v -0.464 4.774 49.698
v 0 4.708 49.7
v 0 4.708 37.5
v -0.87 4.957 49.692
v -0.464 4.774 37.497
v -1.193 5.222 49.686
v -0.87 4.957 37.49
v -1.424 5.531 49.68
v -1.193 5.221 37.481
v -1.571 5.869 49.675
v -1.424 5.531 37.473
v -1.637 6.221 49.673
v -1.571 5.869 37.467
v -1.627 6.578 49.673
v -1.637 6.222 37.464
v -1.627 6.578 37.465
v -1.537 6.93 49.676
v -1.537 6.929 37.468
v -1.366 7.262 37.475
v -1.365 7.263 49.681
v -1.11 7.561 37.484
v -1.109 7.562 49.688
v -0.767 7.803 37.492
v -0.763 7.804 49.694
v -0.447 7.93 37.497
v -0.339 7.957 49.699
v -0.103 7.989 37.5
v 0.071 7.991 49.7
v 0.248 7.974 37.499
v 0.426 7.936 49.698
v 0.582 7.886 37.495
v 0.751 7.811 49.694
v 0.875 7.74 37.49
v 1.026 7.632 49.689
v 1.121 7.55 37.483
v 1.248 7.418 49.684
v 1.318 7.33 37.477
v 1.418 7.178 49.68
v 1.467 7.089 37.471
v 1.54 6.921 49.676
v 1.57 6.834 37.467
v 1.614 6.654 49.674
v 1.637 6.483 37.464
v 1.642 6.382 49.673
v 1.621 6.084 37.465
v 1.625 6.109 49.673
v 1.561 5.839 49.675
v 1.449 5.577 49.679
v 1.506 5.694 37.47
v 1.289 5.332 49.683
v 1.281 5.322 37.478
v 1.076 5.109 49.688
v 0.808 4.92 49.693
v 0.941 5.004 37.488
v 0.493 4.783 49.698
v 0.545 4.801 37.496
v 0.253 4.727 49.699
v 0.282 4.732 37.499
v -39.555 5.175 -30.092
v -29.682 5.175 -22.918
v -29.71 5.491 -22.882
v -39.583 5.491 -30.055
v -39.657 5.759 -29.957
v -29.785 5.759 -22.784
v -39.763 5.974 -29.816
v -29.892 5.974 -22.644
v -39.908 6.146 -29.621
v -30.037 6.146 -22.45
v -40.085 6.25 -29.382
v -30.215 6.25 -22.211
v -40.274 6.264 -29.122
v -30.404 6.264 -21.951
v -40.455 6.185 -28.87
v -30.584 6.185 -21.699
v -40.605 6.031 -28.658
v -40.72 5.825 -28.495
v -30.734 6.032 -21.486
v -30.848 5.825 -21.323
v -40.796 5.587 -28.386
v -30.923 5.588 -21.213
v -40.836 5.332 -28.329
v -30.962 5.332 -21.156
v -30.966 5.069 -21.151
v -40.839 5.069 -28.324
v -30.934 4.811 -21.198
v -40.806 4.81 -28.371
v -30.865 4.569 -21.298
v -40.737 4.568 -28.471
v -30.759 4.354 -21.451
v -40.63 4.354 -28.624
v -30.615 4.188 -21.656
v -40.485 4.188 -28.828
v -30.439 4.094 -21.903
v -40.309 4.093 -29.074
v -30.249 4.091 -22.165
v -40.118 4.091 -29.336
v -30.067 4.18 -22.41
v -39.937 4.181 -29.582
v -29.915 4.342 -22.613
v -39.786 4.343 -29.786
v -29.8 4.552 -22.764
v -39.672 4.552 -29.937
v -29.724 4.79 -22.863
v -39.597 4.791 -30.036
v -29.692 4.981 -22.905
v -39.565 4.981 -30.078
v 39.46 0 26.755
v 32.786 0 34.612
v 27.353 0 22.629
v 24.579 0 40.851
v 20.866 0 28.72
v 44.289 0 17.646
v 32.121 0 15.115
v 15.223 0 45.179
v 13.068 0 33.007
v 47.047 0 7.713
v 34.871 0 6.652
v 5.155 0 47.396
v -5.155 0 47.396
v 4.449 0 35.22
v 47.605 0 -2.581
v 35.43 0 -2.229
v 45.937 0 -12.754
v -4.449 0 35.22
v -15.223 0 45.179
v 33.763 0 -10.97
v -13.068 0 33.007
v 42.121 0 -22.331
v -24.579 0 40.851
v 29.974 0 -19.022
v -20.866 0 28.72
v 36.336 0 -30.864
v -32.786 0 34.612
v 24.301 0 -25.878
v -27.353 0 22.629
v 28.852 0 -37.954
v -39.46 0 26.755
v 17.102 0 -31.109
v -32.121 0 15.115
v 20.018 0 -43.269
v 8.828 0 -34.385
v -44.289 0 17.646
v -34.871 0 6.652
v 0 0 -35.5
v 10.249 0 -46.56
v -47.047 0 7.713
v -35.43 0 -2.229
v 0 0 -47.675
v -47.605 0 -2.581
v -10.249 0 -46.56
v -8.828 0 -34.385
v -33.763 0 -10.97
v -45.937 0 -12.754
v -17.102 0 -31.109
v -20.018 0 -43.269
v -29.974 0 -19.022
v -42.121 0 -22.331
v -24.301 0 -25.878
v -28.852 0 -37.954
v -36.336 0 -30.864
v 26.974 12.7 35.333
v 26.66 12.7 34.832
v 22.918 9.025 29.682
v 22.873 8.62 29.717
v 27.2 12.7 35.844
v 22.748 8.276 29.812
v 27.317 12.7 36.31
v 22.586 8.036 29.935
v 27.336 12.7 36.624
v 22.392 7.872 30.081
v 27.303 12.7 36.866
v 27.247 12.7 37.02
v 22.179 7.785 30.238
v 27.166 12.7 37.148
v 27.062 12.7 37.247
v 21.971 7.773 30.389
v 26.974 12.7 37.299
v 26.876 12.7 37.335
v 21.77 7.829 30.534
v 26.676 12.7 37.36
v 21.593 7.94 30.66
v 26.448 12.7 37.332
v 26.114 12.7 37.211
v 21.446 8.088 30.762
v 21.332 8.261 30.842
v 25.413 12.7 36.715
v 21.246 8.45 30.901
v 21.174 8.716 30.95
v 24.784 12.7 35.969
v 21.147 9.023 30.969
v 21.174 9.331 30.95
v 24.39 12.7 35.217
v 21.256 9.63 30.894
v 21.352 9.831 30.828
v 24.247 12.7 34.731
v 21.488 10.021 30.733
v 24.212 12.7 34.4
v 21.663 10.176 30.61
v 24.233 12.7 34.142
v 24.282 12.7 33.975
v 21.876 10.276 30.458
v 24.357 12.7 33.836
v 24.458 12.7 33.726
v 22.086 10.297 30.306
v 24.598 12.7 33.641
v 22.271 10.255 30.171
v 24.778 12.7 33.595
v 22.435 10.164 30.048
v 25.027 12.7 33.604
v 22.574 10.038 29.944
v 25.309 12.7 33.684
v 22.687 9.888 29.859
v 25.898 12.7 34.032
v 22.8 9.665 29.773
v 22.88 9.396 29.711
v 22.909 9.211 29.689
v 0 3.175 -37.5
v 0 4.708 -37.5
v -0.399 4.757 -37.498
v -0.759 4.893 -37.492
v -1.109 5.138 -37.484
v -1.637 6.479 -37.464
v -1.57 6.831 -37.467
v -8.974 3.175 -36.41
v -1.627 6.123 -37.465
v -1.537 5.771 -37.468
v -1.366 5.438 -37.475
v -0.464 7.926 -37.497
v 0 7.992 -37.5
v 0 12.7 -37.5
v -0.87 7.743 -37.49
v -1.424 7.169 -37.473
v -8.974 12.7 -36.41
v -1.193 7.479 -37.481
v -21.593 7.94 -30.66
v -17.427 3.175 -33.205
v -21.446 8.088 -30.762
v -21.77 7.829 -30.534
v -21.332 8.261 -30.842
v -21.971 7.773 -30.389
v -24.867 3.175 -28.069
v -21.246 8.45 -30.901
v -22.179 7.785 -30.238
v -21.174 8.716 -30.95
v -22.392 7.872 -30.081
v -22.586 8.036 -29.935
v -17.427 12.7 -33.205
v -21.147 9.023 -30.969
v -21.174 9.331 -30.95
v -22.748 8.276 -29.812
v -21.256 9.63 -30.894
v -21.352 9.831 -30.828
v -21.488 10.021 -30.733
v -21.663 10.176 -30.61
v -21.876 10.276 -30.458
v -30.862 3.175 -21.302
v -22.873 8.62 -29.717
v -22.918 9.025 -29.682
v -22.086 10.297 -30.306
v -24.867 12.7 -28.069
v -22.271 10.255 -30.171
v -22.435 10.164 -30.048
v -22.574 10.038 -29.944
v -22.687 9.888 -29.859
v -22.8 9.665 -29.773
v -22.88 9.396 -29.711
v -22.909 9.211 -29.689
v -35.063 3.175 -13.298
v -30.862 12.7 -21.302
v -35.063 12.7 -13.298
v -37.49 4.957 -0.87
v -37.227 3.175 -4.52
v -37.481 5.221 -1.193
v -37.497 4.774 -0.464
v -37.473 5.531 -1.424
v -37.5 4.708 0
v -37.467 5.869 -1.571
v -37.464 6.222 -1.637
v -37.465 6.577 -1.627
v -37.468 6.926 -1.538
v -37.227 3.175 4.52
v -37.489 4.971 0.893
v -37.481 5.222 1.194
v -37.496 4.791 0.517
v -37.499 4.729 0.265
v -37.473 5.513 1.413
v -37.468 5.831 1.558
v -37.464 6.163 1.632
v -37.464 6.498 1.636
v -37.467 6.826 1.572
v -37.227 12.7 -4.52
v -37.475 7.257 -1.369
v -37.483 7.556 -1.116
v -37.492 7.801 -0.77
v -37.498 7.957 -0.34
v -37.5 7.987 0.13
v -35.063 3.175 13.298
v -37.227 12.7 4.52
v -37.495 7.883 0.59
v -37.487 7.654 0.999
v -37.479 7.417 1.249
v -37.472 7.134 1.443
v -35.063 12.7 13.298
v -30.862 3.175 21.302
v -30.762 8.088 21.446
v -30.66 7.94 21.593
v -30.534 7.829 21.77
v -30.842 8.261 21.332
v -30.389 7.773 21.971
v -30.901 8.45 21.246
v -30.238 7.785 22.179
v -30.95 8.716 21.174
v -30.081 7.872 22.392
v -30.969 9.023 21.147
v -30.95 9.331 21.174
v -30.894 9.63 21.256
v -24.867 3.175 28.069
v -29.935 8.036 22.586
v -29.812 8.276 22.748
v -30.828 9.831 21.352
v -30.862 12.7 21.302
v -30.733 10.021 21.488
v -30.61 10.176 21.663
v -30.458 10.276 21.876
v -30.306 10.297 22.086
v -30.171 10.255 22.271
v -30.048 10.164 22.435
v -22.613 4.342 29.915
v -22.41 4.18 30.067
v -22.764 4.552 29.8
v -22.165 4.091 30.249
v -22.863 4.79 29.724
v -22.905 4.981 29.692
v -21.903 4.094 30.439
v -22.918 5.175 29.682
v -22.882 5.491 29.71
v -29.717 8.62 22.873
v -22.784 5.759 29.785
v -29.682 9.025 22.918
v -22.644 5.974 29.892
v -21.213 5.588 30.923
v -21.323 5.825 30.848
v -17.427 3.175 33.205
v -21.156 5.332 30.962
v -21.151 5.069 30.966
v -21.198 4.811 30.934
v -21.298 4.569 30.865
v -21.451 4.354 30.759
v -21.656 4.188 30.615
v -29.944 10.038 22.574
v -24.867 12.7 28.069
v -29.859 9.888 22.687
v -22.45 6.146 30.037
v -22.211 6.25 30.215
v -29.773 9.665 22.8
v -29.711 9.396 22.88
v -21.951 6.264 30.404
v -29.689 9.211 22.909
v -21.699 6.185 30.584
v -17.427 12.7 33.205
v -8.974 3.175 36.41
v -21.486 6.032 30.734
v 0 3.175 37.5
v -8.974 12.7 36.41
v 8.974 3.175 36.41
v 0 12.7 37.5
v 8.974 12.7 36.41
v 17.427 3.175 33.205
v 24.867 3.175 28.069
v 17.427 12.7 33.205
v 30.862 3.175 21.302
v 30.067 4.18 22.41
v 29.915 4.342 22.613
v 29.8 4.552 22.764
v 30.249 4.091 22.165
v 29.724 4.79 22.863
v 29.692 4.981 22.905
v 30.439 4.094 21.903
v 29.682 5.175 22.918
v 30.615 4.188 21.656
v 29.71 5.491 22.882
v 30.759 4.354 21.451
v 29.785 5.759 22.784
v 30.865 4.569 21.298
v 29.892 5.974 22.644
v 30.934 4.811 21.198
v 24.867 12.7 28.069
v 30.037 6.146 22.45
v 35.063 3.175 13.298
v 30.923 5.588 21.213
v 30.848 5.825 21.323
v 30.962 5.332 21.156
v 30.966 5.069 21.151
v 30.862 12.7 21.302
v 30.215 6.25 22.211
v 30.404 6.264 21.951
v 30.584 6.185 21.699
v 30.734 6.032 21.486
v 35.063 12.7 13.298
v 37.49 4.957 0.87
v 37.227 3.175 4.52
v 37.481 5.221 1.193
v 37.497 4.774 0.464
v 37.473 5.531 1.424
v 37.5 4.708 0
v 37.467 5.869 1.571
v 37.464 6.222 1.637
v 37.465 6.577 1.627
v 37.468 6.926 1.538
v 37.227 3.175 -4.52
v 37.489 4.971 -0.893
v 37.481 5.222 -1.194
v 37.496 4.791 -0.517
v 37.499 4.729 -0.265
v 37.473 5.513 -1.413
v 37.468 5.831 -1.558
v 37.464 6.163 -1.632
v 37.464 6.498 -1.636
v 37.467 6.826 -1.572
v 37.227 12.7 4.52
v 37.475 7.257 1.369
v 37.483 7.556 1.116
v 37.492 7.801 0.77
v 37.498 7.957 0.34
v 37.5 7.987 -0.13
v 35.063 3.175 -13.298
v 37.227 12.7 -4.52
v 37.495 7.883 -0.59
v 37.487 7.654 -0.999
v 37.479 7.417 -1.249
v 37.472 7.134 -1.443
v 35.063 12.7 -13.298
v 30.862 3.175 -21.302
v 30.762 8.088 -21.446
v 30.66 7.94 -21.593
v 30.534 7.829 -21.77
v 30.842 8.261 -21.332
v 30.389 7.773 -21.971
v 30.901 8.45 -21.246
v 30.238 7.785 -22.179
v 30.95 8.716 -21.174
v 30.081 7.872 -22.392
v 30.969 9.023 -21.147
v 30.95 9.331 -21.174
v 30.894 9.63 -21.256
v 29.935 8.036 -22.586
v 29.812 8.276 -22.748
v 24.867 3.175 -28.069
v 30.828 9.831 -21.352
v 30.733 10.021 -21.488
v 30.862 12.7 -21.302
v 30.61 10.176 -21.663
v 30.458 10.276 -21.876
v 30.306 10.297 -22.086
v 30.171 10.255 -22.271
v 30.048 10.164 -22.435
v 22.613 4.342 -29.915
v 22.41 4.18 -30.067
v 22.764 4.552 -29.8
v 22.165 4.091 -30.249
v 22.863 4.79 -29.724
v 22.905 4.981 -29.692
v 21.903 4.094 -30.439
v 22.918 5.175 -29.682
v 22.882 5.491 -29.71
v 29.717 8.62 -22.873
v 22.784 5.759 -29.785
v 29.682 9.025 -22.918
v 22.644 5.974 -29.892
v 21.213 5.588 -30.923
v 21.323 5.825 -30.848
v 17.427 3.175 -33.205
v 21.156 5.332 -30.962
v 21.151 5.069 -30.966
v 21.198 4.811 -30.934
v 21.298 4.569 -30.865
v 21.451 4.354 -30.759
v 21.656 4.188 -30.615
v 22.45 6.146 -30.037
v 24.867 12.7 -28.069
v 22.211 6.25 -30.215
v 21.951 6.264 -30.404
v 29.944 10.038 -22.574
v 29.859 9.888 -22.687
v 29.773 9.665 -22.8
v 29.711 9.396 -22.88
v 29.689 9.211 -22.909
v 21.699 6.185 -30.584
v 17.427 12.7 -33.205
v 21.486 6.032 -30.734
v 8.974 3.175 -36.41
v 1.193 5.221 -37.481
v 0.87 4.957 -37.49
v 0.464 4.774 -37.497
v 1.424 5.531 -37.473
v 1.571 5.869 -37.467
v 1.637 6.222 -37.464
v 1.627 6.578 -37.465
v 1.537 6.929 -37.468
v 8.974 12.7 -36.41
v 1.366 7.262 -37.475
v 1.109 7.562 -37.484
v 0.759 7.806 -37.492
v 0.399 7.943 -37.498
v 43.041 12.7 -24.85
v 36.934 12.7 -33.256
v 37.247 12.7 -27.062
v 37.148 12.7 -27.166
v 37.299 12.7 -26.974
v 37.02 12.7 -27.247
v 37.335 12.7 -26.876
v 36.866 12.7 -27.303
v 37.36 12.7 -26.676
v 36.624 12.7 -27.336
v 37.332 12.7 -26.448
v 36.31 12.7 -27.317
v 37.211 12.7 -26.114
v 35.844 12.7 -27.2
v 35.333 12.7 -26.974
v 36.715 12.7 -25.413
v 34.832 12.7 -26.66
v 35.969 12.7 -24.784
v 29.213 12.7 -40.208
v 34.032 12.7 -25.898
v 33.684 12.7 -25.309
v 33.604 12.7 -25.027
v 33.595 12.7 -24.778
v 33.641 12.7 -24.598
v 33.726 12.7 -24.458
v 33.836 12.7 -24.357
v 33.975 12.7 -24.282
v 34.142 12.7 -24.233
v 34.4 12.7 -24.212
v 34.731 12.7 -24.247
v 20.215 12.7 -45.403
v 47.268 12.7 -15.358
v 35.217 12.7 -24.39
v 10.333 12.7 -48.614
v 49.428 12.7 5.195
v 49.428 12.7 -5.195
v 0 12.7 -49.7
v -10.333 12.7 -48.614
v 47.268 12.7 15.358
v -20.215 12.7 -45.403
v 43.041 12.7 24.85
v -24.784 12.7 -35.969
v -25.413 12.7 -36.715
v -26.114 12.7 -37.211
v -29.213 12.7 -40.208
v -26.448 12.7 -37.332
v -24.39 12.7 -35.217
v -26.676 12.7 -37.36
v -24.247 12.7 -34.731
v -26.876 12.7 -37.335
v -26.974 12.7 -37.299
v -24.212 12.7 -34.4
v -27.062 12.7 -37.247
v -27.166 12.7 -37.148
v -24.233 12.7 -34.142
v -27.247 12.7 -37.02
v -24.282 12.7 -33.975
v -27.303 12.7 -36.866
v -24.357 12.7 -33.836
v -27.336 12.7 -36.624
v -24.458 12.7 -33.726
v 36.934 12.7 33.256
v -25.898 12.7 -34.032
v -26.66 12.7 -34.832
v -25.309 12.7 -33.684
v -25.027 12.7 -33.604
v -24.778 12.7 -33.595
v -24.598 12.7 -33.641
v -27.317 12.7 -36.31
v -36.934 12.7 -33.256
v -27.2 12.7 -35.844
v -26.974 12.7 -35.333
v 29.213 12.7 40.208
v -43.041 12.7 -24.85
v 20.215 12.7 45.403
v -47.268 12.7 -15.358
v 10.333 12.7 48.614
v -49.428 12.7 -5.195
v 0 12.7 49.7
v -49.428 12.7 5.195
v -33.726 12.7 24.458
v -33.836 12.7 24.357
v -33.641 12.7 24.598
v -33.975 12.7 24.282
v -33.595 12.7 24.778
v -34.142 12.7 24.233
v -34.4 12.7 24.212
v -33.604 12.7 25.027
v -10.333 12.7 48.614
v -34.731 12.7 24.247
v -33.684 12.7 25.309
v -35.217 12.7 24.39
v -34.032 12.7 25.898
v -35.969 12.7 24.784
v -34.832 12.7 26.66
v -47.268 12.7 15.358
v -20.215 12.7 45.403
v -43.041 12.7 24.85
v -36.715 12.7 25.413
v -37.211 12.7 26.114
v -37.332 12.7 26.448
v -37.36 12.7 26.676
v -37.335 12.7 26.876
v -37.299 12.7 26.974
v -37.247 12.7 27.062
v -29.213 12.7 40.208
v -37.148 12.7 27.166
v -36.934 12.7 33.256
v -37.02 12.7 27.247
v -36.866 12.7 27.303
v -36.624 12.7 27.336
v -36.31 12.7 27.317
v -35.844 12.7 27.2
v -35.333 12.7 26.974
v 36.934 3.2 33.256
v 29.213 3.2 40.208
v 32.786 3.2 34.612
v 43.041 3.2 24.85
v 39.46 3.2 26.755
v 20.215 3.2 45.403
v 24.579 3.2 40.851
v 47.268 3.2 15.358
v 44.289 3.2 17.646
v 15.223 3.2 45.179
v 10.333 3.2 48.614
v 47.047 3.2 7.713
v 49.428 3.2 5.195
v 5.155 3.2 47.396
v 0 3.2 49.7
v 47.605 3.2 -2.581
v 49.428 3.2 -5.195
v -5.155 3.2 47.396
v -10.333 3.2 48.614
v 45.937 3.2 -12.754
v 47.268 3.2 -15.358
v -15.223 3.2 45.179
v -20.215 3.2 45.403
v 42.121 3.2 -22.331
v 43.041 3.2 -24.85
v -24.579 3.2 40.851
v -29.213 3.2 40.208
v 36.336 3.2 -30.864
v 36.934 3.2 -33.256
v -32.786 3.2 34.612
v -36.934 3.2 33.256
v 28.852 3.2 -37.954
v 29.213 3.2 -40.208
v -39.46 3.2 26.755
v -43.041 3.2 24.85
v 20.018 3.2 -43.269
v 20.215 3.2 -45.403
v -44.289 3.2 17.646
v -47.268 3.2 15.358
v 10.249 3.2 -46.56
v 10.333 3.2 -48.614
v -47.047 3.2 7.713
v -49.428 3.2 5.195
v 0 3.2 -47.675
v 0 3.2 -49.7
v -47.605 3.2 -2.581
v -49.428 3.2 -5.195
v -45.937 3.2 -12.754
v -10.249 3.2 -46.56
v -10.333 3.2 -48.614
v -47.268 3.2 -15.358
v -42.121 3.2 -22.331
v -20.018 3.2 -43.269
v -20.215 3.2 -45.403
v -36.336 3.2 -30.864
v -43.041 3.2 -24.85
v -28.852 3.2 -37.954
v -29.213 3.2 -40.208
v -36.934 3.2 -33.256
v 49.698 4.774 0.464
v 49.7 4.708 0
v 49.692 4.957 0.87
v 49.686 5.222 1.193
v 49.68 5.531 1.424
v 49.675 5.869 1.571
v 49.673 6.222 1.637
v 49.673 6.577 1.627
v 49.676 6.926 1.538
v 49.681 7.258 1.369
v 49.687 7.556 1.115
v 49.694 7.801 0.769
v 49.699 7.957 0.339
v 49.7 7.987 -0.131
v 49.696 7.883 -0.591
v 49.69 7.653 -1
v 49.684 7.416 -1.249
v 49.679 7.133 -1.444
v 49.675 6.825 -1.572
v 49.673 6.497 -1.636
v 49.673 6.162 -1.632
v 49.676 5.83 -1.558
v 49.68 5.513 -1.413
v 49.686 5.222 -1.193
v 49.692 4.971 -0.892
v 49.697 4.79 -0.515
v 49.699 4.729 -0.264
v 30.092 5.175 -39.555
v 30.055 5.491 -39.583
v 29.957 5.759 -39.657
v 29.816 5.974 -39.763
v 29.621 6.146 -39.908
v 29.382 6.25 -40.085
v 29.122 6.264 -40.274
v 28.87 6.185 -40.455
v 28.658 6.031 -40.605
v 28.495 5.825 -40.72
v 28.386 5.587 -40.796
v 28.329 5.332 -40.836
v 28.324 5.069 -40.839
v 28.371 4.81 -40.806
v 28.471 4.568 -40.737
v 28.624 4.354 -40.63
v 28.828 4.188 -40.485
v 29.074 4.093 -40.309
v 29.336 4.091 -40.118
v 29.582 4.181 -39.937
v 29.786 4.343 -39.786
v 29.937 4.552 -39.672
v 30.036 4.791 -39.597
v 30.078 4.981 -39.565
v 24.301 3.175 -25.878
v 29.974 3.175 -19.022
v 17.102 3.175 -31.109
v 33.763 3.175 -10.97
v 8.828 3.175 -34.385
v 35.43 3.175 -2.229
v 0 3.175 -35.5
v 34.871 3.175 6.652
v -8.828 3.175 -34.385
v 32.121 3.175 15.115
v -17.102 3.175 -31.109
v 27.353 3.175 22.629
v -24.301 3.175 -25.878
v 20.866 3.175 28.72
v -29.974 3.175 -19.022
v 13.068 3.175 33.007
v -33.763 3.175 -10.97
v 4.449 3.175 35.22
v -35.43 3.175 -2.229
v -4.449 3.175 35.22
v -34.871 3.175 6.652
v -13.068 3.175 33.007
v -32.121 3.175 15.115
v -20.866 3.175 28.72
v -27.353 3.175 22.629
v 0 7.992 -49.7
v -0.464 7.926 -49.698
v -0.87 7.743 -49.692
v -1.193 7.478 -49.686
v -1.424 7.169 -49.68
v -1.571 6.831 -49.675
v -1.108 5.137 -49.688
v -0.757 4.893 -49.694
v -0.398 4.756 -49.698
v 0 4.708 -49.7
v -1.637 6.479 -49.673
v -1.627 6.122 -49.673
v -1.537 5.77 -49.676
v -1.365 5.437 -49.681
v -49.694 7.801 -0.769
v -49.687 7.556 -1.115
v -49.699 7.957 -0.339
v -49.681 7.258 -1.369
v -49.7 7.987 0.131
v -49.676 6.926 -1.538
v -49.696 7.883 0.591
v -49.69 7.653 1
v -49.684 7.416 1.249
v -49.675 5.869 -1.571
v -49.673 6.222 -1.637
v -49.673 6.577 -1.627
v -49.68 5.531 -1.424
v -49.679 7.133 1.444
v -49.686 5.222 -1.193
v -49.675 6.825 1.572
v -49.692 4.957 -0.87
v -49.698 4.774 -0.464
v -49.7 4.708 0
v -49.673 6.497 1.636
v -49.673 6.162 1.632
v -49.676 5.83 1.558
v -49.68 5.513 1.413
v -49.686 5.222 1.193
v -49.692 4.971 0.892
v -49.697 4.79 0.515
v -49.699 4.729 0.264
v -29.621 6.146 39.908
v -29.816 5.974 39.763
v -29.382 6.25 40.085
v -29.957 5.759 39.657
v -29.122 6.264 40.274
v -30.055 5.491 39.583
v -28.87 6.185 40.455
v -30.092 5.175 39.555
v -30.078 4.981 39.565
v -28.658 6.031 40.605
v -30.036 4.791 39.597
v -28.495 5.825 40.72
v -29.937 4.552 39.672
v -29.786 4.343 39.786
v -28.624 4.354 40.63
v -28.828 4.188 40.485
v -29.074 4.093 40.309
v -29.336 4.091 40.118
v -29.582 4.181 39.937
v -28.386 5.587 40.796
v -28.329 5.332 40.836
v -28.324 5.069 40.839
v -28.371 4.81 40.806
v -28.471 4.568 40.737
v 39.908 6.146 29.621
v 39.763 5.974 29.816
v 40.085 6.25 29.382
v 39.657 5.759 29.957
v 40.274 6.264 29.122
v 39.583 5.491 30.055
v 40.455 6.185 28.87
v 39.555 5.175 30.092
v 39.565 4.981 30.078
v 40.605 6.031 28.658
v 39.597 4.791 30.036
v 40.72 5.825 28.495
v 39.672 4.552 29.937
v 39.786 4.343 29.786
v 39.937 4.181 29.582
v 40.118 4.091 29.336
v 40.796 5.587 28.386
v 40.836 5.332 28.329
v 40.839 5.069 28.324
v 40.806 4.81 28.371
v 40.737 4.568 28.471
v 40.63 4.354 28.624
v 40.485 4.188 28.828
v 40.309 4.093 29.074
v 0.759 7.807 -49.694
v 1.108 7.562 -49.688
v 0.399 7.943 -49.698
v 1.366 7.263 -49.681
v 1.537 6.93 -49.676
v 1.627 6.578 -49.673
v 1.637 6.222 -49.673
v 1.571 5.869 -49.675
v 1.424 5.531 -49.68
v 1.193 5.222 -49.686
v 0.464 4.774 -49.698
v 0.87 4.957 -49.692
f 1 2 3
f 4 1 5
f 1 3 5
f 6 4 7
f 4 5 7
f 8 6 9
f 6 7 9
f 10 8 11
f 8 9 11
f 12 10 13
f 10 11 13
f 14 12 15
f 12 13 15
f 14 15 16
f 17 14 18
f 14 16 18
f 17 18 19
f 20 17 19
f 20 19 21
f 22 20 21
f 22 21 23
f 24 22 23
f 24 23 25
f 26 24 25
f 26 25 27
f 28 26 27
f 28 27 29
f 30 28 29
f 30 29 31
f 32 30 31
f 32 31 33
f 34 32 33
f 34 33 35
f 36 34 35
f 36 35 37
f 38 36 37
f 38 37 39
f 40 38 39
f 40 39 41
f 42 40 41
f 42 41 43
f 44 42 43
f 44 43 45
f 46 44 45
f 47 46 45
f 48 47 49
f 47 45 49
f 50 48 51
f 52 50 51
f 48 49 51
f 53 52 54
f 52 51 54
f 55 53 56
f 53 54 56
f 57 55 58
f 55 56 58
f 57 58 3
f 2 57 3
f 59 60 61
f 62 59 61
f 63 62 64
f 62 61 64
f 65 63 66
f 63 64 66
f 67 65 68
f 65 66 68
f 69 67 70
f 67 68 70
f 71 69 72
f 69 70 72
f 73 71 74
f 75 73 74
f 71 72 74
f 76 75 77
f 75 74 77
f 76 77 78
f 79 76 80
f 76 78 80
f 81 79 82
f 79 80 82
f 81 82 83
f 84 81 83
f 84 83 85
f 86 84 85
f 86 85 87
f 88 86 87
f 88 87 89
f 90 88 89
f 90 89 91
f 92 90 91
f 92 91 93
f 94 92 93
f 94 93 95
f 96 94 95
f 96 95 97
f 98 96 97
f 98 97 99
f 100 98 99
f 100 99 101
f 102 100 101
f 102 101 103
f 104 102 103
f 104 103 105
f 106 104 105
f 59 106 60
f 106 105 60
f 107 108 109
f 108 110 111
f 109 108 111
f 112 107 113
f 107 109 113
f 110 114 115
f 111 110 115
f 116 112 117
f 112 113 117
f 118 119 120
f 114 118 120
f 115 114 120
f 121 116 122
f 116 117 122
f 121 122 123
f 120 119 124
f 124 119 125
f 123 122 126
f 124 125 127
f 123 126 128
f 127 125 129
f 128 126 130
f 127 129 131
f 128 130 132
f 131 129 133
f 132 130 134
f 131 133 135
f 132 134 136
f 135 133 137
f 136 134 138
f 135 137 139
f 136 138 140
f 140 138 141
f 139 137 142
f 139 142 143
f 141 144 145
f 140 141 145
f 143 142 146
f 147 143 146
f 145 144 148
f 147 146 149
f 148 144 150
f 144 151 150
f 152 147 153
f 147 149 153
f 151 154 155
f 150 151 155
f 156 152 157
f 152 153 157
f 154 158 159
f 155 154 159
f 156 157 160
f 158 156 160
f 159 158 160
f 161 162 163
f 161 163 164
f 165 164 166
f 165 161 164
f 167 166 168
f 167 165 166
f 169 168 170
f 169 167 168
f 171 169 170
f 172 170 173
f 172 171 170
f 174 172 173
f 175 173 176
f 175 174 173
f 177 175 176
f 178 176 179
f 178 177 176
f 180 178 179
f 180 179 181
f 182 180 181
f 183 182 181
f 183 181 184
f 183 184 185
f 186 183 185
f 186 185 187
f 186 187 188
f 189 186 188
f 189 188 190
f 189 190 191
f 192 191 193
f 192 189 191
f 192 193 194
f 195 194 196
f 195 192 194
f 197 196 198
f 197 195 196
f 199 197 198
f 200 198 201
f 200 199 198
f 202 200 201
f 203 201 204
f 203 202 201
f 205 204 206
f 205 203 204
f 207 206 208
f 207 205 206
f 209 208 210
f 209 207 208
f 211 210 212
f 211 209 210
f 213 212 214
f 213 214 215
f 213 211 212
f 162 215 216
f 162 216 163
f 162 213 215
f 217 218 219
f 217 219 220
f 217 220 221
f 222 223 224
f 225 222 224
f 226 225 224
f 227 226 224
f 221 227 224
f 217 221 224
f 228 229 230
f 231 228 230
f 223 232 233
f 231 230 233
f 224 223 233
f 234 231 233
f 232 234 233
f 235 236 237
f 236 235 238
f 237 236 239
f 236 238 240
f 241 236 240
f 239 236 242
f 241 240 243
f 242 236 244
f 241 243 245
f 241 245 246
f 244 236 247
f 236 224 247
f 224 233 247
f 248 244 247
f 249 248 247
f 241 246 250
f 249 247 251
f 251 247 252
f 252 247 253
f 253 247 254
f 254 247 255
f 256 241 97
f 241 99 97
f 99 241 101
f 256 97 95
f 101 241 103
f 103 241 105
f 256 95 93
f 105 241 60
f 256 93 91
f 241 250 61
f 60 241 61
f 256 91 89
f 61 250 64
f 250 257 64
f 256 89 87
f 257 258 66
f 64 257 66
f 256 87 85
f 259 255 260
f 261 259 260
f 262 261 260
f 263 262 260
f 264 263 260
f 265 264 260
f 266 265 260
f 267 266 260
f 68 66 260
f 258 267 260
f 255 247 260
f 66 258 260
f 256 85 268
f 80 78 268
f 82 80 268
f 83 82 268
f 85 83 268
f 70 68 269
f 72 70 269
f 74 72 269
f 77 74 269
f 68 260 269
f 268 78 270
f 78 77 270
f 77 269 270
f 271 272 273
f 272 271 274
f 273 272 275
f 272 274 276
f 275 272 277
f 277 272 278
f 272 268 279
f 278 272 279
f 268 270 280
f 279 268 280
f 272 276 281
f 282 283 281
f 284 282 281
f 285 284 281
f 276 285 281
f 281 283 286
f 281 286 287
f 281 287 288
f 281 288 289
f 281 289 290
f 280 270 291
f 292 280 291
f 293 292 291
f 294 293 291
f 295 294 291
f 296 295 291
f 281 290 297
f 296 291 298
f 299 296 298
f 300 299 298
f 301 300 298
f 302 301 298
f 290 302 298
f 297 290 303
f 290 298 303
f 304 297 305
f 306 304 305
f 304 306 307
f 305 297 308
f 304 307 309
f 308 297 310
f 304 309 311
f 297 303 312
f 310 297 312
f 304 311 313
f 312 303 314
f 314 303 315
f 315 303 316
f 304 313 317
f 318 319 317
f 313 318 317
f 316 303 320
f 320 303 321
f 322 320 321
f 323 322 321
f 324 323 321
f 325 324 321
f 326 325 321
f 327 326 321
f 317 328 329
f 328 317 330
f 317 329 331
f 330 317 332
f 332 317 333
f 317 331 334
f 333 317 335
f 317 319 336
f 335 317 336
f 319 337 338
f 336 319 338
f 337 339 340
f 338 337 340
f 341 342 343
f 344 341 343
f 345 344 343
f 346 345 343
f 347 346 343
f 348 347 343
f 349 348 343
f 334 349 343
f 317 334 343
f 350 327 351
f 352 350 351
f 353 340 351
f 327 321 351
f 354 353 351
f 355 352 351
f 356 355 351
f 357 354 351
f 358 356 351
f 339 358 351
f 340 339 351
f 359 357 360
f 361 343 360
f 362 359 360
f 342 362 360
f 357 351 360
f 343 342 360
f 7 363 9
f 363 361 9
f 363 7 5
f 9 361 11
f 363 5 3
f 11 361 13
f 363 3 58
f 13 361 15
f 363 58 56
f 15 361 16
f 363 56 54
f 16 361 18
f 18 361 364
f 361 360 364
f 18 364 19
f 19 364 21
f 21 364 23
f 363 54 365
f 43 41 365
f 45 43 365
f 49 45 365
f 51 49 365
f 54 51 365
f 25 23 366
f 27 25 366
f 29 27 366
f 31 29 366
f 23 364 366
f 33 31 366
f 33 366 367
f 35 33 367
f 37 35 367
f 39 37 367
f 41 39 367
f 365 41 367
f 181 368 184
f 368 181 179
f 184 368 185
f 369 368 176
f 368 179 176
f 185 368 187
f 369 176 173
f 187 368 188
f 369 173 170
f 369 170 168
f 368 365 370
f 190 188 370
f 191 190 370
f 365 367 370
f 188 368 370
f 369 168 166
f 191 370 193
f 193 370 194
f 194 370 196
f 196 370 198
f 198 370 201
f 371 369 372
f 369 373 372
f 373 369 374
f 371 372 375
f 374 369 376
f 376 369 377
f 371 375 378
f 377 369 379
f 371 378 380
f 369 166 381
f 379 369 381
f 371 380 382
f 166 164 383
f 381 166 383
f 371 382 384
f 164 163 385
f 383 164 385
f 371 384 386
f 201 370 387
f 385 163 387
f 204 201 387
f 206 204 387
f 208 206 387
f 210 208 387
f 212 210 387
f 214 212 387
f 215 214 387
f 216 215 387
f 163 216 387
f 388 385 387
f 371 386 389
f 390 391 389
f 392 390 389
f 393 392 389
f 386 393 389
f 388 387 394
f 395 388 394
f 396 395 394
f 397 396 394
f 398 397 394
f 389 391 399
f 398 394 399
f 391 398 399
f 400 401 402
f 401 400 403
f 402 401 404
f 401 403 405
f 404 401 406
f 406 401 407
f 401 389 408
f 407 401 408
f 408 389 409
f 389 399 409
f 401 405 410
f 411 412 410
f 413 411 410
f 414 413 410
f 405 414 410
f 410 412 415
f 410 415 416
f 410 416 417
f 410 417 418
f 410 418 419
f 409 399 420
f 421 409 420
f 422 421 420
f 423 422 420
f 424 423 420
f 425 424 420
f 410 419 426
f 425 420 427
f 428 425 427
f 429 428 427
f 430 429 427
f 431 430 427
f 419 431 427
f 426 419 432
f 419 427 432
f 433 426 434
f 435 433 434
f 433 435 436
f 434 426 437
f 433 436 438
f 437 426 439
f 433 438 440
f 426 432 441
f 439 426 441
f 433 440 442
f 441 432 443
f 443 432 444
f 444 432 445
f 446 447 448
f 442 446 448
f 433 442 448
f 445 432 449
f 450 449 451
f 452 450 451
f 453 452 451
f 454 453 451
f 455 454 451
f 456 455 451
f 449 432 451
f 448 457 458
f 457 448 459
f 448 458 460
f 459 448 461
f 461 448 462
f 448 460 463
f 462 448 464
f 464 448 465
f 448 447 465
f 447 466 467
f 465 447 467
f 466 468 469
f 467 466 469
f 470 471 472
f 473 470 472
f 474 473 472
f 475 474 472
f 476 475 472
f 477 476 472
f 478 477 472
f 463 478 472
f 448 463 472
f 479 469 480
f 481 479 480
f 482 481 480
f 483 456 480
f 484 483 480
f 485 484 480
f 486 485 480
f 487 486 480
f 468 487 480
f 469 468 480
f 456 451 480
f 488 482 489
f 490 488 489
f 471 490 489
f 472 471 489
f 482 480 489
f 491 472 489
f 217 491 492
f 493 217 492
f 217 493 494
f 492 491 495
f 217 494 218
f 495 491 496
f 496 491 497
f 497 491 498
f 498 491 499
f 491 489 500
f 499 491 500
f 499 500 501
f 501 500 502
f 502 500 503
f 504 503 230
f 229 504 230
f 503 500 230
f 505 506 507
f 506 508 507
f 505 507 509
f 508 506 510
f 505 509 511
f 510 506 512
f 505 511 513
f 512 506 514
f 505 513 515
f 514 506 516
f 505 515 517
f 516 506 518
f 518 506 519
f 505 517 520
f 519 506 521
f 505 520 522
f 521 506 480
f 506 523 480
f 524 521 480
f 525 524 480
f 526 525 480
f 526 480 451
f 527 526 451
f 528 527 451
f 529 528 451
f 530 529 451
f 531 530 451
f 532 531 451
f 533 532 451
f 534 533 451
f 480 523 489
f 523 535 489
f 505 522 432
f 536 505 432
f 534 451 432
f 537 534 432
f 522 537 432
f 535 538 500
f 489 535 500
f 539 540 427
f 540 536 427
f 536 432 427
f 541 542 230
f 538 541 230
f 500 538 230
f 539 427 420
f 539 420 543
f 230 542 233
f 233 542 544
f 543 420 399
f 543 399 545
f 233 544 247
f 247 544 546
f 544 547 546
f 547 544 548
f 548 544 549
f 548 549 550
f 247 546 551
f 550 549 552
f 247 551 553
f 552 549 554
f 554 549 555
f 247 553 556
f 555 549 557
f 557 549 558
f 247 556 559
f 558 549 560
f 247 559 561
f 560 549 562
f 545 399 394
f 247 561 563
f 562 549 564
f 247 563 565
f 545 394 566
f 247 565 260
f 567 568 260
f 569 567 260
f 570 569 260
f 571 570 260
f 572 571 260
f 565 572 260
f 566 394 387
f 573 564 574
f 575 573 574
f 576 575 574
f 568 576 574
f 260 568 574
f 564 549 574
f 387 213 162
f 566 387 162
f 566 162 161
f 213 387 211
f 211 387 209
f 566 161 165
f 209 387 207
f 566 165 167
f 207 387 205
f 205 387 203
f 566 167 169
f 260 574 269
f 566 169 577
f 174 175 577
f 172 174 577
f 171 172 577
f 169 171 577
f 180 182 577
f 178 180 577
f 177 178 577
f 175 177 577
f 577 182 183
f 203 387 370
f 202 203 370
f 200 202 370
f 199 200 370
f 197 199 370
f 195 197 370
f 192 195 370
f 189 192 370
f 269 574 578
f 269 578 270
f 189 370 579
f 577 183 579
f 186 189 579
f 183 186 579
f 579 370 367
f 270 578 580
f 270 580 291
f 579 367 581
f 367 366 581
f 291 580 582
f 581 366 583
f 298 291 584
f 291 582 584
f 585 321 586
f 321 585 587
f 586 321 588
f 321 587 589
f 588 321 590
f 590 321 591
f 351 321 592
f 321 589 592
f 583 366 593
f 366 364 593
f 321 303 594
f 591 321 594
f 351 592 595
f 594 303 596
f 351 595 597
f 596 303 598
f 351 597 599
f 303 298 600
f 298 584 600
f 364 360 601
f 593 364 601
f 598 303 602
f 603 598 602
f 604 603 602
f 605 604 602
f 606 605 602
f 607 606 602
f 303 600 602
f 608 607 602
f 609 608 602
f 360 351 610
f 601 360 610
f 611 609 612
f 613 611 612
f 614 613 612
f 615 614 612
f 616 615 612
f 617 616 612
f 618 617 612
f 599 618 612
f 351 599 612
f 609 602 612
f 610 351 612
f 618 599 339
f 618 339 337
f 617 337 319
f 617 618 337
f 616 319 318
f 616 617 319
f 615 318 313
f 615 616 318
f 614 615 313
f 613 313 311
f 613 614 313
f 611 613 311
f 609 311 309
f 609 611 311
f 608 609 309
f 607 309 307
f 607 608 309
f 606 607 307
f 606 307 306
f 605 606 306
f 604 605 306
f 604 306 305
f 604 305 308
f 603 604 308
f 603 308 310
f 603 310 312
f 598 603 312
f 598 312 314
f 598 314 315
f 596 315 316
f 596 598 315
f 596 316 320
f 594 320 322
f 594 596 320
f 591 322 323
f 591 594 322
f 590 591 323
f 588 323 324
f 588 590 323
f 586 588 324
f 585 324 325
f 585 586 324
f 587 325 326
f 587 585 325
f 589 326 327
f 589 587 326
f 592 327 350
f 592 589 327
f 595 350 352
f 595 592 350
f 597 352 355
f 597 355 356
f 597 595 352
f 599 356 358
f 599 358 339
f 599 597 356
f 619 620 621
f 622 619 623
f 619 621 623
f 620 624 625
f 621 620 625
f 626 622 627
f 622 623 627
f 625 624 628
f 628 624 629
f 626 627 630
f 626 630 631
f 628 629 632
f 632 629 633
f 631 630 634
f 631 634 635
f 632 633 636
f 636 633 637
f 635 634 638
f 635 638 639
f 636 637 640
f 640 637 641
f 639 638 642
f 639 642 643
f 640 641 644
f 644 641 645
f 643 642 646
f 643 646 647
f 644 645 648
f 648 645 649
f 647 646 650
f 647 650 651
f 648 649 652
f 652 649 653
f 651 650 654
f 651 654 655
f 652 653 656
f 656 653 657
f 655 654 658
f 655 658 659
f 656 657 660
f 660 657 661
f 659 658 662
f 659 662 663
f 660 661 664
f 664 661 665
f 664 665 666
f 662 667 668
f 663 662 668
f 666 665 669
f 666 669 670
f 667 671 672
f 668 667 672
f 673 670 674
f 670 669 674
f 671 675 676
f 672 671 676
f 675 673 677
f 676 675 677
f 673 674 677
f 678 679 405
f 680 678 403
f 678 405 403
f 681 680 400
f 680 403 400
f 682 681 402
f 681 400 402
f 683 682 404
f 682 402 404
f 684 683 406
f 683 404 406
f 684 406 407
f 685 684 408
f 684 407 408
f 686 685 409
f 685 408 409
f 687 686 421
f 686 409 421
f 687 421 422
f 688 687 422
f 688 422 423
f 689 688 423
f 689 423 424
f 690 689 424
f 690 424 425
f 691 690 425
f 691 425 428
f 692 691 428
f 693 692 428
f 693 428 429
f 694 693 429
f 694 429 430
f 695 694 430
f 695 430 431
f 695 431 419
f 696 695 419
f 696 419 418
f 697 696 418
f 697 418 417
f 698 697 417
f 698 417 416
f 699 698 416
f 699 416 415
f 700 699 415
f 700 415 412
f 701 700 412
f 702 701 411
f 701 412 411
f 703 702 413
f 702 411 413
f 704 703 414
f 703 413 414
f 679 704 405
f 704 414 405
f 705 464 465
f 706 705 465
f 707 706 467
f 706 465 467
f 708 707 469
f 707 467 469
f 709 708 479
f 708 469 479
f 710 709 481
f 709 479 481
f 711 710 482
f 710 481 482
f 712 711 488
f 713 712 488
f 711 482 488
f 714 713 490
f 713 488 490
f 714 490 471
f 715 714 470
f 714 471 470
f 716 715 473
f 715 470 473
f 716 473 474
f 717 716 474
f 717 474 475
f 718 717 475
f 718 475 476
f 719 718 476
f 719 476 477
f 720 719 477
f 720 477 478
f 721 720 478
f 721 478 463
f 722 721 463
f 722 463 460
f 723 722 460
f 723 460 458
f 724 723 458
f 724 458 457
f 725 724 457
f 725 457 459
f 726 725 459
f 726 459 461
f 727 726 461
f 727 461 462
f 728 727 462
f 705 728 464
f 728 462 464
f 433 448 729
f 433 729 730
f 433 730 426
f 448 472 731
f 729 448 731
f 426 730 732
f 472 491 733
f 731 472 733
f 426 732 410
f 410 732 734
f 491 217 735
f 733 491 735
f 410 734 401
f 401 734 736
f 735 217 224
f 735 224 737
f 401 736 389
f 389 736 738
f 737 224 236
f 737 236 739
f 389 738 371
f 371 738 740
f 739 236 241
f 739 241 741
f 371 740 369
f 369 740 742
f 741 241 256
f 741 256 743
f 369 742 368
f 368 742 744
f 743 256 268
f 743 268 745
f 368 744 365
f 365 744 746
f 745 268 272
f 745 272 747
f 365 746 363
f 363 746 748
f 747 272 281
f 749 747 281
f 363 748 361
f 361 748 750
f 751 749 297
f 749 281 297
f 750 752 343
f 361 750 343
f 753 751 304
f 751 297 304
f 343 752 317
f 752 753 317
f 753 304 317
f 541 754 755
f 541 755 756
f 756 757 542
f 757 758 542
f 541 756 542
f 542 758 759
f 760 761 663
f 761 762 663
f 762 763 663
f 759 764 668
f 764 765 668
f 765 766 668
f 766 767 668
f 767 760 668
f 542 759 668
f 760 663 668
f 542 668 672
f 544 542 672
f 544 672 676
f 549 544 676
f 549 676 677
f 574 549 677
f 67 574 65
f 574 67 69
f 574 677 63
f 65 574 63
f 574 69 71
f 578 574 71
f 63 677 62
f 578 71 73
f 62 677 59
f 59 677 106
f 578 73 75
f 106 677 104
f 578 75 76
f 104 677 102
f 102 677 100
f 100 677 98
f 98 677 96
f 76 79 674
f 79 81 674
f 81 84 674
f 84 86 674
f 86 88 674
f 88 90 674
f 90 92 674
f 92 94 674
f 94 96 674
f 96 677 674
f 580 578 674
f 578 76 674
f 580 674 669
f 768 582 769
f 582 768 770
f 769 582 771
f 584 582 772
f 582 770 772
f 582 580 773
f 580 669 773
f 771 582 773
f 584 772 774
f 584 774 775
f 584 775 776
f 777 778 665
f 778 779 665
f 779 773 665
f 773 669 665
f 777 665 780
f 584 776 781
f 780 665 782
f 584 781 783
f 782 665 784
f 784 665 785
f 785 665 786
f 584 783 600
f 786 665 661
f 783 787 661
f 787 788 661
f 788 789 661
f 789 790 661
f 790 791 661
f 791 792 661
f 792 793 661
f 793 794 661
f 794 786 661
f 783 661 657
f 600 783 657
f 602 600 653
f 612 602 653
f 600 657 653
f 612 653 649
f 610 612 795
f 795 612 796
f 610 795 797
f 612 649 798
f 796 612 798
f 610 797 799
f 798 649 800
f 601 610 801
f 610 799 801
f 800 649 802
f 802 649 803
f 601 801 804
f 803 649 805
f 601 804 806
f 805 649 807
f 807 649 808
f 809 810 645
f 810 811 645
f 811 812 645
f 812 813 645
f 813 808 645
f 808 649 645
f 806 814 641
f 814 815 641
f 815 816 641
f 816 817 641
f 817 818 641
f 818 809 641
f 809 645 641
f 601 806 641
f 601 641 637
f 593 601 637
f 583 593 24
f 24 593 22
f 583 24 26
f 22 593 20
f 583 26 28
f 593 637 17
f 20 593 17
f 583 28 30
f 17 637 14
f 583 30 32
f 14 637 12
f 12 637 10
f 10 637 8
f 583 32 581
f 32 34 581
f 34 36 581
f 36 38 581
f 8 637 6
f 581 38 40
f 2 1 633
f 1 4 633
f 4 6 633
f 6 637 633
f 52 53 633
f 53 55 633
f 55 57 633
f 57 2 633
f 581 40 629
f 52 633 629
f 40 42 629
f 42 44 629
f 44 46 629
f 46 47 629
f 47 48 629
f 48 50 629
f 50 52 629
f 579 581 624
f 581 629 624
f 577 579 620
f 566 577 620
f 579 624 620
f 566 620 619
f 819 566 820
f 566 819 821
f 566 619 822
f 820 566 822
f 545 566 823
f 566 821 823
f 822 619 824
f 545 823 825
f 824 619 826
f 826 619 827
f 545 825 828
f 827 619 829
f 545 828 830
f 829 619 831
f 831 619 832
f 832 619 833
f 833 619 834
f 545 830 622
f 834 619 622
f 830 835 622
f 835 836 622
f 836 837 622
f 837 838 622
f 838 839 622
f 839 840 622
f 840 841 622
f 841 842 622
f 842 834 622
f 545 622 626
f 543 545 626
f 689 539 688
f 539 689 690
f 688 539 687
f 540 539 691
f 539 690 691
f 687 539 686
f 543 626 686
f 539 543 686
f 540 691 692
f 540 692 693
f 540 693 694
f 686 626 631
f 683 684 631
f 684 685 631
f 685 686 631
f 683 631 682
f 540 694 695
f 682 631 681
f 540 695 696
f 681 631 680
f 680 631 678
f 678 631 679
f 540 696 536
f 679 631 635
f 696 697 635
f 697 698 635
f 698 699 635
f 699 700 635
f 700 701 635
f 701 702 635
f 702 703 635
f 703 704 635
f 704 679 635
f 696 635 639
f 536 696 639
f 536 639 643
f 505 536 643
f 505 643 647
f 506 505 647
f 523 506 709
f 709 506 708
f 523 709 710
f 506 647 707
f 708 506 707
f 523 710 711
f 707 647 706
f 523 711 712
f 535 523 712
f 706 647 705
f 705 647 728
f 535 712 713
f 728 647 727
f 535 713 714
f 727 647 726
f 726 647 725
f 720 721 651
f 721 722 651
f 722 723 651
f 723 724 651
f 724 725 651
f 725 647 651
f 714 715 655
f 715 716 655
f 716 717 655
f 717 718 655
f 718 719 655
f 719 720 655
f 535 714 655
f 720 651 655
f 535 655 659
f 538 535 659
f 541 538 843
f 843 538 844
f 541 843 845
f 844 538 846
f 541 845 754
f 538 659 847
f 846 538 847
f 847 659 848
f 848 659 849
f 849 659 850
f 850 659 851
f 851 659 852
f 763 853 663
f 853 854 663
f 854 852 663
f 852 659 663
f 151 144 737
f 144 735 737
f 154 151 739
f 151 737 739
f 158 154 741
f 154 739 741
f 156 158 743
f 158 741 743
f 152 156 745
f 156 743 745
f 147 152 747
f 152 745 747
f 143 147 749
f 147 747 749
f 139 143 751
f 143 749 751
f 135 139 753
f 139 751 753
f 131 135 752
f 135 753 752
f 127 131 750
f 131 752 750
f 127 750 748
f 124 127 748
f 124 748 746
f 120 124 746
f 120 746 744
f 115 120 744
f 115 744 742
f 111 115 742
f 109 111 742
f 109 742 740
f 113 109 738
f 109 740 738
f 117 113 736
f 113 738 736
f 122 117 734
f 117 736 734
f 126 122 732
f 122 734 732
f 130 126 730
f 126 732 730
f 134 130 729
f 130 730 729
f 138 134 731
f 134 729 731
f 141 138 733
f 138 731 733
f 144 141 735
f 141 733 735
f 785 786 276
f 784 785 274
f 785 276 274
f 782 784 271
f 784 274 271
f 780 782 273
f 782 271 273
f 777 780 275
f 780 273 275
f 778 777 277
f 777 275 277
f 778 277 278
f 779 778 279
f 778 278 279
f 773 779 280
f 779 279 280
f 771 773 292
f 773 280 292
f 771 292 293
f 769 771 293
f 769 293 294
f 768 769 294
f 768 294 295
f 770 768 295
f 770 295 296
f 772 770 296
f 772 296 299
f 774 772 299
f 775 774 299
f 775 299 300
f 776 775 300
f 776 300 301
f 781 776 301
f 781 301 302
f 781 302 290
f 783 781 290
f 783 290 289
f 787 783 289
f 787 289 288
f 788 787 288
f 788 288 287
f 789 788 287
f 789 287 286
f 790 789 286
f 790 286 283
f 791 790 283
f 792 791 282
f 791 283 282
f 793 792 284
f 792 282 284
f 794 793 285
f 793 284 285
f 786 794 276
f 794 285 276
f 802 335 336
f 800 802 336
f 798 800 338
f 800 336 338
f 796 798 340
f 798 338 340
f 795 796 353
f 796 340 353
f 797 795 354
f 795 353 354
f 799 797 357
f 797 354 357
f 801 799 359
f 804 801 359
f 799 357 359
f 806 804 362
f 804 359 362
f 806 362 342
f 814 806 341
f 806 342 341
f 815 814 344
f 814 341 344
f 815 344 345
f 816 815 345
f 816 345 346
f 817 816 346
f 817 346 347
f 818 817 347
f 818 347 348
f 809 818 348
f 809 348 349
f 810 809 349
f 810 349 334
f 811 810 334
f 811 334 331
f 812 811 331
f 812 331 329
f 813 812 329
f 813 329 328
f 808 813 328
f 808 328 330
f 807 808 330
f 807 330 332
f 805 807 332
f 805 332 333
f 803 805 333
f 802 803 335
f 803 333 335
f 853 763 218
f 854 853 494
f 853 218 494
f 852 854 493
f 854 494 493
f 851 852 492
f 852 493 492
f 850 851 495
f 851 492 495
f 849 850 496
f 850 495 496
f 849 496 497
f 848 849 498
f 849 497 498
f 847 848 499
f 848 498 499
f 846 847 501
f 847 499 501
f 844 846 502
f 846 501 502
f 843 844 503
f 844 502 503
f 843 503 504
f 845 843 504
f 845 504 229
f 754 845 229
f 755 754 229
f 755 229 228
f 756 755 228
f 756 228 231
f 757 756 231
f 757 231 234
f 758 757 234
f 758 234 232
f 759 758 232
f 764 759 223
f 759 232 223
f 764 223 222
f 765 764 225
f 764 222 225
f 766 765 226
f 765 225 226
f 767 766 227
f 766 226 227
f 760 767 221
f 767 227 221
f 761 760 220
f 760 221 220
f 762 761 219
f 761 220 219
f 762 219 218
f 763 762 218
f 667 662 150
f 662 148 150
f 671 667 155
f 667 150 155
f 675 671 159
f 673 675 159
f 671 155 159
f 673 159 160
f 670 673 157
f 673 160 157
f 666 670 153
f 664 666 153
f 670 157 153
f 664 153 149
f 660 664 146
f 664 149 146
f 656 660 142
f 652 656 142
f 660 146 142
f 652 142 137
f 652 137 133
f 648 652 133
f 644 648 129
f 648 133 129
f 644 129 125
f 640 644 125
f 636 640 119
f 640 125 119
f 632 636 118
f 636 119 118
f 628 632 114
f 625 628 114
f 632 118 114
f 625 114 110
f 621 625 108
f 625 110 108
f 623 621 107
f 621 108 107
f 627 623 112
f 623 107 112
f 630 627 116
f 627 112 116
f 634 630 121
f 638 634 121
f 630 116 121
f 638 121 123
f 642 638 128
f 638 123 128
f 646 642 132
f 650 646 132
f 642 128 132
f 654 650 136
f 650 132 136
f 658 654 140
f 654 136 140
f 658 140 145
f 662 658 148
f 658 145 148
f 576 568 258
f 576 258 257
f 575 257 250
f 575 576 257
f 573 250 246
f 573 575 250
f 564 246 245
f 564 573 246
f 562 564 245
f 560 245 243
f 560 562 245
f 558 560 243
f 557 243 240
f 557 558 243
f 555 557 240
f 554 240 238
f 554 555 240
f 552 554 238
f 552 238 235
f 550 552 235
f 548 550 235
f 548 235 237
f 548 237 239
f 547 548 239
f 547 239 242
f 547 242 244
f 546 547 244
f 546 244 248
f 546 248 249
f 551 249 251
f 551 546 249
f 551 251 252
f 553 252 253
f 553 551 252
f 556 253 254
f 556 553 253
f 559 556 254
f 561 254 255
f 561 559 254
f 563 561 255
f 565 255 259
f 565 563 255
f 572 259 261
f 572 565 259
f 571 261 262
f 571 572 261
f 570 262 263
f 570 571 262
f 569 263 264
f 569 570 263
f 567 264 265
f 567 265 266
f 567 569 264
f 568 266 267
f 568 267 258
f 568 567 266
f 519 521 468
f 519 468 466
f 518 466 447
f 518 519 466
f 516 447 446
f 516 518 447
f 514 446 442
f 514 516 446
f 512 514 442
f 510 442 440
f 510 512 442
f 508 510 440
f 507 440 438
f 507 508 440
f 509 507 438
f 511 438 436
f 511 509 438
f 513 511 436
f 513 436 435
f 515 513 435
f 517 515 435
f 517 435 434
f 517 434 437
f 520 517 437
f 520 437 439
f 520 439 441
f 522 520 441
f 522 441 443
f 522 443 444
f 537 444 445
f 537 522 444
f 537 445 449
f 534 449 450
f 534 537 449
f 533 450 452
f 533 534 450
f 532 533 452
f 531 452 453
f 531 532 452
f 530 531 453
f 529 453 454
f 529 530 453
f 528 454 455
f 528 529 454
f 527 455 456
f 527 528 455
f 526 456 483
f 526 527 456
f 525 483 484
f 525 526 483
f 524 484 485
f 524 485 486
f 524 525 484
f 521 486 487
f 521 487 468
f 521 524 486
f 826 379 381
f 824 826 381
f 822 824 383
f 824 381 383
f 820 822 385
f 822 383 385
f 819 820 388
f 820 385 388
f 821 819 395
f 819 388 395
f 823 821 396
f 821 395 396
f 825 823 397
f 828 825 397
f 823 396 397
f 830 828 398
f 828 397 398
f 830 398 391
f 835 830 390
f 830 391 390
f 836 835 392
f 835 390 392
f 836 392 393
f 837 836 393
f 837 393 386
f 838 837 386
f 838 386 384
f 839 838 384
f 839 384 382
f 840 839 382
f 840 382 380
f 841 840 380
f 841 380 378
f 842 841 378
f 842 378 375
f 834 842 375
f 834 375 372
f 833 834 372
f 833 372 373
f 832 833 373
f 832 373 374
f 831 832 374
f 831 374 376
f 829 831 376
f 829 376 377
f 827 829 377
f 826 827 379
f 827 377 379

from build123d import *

# Parameters (mm, degrees)
SKETCH5_R          = 1.6425
CUT_EXTRUDE1_DEPTH = 50.7
SKETCH6_R          = 1.095
CUT_EXTRUDE2_DEPTH = 70.421071799
CUT_EXTRUDE3_START = -7.395857
SKETCH7_R          = 1.095
CUT_EXTRUDE3_DEPTH = 9.861143
CIRPATTERN1_COUNT  = 4


with BuildPart() as part:
    # Sketch2 → Revolve1 (revolve)
    with BuildSketch(Plane.XY, mode=Mode.PRIVATE) as revolve1_sk:
        Polygon((49.7, 12.7), (49.7, 3.2004), (47.675, 3.2004), (47.675, 0), (35.5, 0), (35.5, 3.175), (37.5, 3.175), (37.5, 12.7), align=None)
    revolve(revolve1_sk.sketch.rotate(Axis((0, 0, 0), (0, 1, 0)), 90), axis=Axis((0, 0, 0), (0, 1, 0)))  # turned: the seam where the file's is

    # Sketch5 → Cut-Extrude1 (cut, through all)
    with BuildSketch(Plane.XY):
        with Locations(Location((0, 6.35, 0), (0, 0, 270))):  # turned: the seam where the file's is
            Circle(SKETCH5_R)
    cut_extrude1 = extrude(amount=-CUT_EXTRUDE1_DEPTH, mode=Mode.SUBTRACT)

    # Sketch6 → Cut-Extrude2 (cut, through all)
    with BuildSketch(Plane(origin=(0, 0, 0), x_dir=(0.809016994, 0, 0.587785252), z_dir=(-0.587785252, 0, 0.809016994))):
        with Locations((0, 5.175)):
            Circle(SKETCH6_R)
    cut_extrude2 = extrude(amount=-CUT_EXTRUDE2_DEPTH, mode=Mode.SUBTRACT)

    # Sketch7 → Cut-Extrude3 (cut)
    with BuildSketch(Plane(origin=(-19.76384492, 19.412976321, -27.202598826), x_dir=(0.809016994, 0, -0.587785252), z_dir=(0.50903696, -0.5, 0.700629269)).offset(CUT_EXTRUDE3_START)):
        with Locations(Location((0, -10.926477372, 0), (0, 0, 180))):  # turned: the seam where the file's is
            Circle(SKETCH7_R)
    cut_extrude3 = extrude(amount=CUT_EXTRUDE3_DEPTH, mode=Mode.SUBTRACT)

    # CirPattern1: Cut-Extrude1, Cut-Extrude2, Cut-Extrude3 ×4 about axis
    cirpattern1_axis = Axis((0, 13.335, 0), (0, -1, 0))
    add([cut_extrude1.rotate(cirpattern1_axis, i * 360 / CIRPATTERN1_COUNT) for i in range(1, CIRPATTERN1_COUNT)], mode=Mode.SUBTRACT)
    add([cut_extrude2.rotate(cirpattern1_axis, i * 360 / CIRPATTERN1_COUNT) for i in range(1, CIRPATTERN1_COUNT)], mode=Mode.SUBTRACT)
    add([cut_extrude3.rotate(cirpattern1_axis, i * 360 / CIRPATTERN1_COUNT) for i in range(1, CIRPATTERN1_COUNT)], mode=Mode.SUBTRACT)


solid = part.part
